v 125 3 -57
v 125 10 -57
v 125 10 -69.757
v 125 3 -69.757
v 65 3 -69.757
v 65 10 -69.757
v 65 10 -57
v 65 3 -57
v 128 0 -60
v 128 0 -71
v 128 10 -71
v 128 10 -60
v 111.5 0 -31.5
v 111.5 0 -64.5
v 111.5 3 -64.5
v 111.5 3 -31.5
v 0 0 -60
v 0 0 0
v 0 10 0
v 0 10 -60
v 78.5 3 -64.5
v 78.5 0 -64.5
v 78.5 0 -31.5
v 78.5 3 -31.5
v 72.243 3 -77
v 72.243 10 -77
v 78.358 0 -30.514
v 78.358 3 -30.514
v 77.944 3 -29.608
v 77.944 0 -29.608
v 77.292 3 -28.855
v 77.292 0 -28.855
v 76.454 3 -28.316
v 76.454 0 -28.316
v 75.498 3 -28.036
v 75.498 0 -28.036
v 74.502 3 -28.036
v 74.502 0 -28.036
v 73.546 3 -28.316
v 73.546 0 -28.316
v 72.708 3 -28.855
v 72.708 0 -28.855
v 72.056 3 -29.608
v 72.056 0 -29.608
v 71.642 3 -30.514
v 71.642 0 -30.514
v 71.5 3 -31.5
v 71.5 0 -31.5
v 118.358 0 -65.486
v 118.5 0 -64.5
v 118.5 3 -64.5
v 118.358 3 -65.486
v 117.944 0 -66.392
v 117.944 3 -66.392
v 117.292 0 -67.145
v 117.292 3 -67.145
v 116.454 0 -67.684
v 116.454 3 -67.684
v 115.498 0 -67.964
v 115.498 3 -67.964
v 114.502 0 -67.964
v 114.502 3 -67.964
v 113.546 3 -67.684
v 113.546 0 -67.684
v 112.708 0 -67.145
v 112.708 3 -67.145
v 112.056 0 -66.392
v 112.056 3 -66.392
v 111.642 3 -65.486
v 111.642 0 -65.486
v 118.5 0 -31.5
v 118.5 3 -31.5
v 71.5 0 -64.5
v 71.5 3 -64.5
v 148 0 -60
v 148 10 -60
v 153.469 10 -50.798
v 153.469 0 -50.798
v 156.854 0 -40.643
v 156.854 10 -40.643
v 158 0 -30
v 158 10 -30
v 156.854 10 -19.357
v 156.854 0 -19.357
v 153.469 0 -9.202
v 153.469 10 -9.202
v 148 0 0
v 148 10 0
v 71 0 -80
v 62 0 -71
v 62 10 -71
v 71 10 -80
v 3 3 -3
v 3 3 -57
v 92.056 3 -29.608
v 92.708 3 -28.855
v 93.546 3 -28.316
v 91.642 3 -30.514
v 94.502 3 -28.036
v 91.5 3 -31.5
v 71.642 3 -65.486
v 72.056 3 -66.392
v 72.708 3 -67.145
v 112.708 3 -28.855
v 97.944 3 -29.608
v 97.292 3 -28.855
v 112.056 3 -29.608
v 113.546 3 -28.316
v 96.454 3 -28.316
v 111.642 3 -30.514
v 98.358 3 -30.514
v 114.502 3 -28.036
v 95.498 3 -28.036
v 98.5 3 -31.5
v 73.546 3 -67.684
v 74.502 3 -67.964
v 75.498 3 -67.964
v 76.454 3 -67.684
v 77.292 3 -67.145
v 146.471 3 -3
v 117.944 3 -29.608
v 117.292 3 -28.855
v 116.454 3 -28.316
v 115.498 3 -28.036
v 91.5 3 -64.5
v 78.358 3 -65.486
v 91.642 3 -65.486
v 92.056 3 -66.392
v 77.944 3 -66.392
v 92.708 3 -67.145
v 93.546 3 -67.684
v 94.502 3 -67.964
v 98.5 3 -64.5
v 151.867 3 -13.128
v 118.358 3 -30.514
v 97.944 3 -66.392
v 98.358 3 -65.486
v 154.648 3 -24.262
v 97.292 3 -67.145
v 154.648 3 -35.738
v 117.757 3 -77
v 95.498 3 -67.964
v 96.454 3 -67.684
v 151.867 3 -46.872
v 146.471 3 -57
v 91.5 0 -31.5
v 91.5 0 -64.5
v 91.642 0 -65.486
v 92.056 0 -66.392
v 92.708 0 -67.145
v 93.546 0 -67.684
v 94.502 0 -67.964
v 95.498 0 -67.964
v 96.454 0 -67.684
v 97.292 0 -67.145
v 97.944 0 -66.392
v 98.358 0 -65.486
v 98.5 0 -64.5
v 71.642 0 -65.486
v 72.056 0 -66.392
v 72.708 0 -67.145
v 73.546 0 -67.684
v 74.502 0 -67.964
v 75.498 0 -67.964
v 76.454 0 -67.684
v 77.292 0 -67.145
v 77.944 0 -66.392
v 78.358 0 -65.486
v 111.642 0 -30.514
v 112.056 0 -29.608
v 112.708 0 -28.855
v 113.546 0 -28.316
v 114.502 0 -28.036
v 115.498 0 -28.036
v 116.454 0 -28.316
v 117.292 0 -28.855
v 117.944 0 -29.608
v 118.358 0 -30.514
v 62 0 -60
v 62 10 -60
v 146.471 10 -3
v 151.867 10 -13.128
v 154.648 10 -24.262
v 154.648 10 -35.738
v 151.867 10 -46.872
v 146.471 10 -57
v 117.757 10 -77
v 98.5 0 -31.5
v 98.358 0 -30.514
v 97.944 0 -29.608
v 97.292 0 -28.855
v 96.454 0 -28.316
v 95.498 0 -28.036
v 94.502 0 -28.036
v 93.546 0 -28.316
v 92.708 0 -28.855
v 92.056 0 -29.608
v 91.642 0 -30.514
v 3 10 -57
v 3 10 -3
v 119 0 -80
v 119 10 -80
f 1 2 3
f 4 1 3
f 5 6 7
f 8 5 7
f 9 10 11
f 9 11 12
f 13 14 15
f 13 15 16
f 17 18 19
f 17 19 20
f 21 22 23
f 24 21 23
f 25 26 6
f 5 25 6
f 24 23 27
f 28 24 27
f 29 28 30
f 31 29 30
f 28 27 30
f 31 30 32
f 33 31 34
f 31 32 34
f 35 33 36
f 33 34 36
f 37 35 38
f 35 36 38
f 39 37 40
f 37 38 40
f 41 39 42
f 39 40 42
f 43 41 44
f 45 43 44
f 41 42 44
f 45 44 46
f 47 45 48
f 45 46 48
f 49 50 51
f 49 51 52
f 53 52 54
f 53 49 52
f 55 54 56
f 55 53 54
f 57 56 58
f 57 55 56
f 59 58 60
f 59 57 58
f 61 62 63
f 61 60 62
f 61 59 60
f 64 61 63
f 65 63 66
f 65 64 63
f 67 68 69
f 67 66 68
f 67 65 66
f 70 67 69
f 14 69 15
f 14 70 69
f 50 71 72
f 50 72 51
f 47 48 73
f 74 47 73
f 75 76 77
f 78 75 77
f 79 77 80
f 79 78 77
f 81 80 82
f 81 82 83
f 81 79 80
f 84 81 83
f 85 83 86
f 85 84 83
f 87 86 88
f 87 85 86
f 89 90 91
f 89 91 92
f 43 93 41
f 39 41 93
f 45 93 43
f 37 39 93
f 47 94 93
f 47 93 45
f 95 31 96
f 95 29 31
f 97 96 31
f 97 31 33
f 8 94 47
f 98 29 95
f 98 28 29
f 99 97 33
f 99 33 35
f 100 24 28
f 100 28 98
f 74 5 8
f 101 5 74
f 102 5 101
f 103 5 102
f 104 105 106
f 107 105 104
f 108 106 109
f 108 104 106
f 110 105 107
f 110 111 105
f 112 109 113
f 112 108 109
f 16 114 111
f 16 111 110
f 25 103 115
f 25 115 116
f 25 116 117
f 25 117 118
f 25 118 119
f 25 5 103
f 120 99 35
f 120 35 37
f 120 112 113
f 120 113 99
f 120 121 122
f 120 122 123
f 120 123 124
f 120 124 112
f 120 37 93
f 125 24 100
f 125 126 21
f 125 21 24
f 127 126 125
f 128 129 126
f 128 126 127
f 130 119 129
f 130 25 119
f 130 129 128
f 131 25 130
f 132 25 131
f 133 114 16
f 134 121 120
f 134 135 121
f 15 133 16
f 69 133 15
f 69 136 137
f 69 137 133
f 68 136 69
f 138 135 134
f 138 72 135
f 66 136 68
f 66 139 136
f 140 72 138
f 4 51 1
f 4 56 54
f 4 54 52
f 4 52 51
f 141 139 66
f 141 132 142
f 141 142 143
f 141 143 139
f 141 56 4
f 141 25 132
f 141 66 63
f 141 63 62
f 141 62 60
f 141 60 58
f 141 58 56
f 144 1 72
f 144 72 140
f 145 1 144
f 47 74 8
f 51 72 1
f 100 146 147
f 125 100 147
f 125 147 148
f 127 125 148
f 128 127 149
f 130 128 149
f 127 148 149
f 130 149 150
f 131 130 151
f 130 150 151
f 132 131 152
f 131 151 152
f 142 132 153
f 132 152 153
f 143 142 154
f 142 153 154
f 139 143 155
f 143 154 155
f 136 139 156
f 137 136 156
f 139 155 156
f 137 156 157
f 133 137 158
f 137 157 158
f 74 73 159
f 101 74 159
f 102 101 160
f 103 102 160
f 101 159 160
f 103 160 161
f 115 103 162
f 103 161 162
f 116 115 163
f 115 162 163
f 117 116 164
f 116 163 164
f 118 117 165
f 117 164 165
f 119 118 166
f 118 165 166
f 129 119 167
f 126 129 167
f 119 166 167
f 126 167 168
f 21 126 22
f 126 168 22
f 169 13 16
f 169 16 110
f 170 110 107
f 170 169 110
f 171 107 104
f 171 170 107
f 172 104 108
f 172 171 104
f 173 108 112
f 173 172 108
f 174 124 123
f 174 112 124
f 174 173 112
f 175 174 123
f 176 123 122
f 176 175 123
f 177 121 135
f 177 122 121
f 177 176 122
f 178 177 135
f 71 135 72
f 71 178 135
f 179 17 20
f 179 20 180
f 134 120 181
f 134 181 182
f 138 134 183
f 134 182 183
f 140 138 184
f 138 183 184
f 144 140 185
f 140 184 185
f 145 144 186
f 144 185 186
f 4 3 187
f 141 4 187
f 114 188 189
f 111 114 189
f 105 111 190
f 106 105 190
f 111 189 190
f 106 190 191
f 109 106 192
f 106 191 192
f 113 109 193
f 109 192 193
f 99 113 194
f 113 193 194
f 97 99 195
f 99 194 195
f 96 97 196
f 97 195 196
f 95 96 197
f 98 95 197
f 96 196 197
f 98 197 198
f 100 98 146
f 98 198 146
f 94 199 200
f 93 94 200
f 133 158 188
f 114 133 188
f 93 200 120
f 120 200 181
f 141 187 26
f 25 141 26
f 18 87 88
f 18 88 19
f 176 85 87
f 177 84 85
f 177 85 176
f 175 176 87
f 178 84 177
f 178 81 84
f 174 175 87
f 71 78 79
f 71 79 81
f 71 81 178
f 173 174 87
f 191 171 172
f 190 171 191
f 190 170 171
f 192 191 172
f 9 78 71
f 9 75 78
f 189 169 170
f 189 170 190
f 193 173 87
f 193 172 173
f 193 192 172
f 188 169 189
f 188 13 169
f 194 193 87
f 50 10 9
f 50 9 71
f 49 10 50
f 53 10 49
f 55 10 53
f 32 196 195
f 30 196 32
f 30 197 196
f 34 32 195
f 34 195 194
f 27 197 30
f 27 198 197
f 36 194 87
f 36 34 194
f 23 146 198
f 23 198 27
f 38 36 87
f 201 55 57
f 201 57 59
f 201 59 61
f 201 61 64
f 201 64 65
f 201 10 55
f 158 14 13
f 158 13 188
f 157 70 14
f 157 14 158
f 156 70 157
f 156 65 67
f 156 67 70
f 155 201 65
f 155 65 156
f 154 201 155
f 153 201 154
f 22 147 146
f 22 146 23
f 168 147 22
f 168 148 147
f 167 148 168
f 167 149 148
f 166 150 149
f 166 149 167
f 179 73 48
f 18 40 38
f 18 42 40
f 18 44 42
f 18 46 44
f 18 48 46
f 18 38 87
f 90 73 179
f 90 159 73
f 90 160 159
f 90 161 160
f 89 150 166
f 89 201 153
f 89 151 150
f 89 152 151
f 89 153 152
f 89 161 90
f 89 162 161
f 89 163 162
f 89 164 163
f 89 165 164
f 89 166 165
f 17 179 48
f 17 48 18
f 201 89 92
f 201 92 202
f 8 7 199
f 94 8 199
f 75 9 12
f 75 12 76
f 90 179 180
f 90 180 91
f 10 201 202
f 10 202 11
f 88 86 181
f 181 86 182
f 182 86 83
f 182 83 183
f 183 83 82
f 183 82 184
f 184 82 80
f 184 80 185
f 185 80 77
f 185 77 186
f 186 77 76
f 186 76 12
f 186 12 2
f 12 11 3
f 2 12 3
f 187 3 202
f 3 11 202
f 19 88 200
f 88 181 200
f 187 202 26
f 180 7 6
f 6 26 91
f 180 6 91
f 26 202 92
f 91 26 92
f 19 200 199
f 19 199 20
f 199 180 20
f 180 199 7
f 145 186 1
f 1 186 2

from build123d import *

# Parameters (mm, degrees)
EXTRUDE_1_DEPTH     = 10
CUT_EXTRUDE_1_DEPTH = 7


with BuildPart() as part:
    # Эскиз1 → Бобышка-Вытянуть1 (new body)
    with BuildSketch(Plane(origin=(0, 0, 0), x_dir=(1, 0, 0), z_dir=(0, 1, 0))):
        with BuildLine():
            Line((0, 0), (0, 60))
            Line((0, 60), (62, 60))
            Line((62, 60), (62, 71))
            Line((62, 71), (71, 80))
            Line((71, 80), (119, 80))
            Line((119, 80), (128, 71))
            Line((128, 71), (128, 60))
            Line((128, 60), (148, 60))
            ThreePointArc((148, 60), (158, 30), (148, 0))
            Line((148, 0), (0, 0))
        make_face()
        with BuildLine():
            Line((98.5, 64.5), (98.5, 31.5))
            ThreePointArc((98.5, 31.5), (95, 28), (91.5, 31.5))
            Line((91.5, 31.5), (91.5, 64.5))
            ThreePointArc((91.5, 64.5), (95, 68), (98.5, 64.5))
        make_face(mode=Mode.SUBTRACT)
        with BuildLine():
            Line((78.5, 64.5), (78.5, 31.5))
            ThreePointArc((78.5, 31.5), (75, 28), (71.5, 31.5))
            Line((71.5, 31.5), (71.5, 64.5))
            ThreePointArc((71.5, 64.5), (75, 68), (78.5, 64.5))
        make_face(mode=Mode.SUBTRACT)
        with BuildLine():
            Line((111.5, 64.5), (111.5, 31.5))
            ThreePointArc((111.5, 31.5), (115, 28), (118.5, 31.5))
            Line((118.5, 31.5), (118.5, 64.5))
            ThreePointArc((118.5, 64.5), (115, 68), (111.5, 64.5))
        make_face(mode=Mode.SUBTRACT)
    extrude(amount=EXTRUDE_1_DEPTH)

    # Эскиз3 → Вырез-Вытянуть1 (cut)
    with BuildSketch(Plane(origin=(0, 10, 0), x_dir=(1, 0, 0), z_dir=(0, 1, 0))):
        with BuildLine():
            Line((125, 57), (125, 69.757359313))
            Line((125, 69.757359313), (117.757359313, 77))
            Line((117.757359313, 77), (72.242640687, 77))
            Line((72.242640687, 77), (65, 69.757359313))
            Line((65, 69.757359313), (65, 57))
            Line((65, 57), (3, 57))
            Line((3, 57), (3, 3))
            Line((3, 3), (146.470768123, 3))
            ThreePointArc((146.470768123, 3), (155, 30), (146.470768123, 57))
            Line((146.470768123, 57), (125, 57))
        make_face()
    extrude(amount=-CUT_EXTRUDE_1_DEPTH, mode=Mode.SUBTRACT)


solid = part.part
